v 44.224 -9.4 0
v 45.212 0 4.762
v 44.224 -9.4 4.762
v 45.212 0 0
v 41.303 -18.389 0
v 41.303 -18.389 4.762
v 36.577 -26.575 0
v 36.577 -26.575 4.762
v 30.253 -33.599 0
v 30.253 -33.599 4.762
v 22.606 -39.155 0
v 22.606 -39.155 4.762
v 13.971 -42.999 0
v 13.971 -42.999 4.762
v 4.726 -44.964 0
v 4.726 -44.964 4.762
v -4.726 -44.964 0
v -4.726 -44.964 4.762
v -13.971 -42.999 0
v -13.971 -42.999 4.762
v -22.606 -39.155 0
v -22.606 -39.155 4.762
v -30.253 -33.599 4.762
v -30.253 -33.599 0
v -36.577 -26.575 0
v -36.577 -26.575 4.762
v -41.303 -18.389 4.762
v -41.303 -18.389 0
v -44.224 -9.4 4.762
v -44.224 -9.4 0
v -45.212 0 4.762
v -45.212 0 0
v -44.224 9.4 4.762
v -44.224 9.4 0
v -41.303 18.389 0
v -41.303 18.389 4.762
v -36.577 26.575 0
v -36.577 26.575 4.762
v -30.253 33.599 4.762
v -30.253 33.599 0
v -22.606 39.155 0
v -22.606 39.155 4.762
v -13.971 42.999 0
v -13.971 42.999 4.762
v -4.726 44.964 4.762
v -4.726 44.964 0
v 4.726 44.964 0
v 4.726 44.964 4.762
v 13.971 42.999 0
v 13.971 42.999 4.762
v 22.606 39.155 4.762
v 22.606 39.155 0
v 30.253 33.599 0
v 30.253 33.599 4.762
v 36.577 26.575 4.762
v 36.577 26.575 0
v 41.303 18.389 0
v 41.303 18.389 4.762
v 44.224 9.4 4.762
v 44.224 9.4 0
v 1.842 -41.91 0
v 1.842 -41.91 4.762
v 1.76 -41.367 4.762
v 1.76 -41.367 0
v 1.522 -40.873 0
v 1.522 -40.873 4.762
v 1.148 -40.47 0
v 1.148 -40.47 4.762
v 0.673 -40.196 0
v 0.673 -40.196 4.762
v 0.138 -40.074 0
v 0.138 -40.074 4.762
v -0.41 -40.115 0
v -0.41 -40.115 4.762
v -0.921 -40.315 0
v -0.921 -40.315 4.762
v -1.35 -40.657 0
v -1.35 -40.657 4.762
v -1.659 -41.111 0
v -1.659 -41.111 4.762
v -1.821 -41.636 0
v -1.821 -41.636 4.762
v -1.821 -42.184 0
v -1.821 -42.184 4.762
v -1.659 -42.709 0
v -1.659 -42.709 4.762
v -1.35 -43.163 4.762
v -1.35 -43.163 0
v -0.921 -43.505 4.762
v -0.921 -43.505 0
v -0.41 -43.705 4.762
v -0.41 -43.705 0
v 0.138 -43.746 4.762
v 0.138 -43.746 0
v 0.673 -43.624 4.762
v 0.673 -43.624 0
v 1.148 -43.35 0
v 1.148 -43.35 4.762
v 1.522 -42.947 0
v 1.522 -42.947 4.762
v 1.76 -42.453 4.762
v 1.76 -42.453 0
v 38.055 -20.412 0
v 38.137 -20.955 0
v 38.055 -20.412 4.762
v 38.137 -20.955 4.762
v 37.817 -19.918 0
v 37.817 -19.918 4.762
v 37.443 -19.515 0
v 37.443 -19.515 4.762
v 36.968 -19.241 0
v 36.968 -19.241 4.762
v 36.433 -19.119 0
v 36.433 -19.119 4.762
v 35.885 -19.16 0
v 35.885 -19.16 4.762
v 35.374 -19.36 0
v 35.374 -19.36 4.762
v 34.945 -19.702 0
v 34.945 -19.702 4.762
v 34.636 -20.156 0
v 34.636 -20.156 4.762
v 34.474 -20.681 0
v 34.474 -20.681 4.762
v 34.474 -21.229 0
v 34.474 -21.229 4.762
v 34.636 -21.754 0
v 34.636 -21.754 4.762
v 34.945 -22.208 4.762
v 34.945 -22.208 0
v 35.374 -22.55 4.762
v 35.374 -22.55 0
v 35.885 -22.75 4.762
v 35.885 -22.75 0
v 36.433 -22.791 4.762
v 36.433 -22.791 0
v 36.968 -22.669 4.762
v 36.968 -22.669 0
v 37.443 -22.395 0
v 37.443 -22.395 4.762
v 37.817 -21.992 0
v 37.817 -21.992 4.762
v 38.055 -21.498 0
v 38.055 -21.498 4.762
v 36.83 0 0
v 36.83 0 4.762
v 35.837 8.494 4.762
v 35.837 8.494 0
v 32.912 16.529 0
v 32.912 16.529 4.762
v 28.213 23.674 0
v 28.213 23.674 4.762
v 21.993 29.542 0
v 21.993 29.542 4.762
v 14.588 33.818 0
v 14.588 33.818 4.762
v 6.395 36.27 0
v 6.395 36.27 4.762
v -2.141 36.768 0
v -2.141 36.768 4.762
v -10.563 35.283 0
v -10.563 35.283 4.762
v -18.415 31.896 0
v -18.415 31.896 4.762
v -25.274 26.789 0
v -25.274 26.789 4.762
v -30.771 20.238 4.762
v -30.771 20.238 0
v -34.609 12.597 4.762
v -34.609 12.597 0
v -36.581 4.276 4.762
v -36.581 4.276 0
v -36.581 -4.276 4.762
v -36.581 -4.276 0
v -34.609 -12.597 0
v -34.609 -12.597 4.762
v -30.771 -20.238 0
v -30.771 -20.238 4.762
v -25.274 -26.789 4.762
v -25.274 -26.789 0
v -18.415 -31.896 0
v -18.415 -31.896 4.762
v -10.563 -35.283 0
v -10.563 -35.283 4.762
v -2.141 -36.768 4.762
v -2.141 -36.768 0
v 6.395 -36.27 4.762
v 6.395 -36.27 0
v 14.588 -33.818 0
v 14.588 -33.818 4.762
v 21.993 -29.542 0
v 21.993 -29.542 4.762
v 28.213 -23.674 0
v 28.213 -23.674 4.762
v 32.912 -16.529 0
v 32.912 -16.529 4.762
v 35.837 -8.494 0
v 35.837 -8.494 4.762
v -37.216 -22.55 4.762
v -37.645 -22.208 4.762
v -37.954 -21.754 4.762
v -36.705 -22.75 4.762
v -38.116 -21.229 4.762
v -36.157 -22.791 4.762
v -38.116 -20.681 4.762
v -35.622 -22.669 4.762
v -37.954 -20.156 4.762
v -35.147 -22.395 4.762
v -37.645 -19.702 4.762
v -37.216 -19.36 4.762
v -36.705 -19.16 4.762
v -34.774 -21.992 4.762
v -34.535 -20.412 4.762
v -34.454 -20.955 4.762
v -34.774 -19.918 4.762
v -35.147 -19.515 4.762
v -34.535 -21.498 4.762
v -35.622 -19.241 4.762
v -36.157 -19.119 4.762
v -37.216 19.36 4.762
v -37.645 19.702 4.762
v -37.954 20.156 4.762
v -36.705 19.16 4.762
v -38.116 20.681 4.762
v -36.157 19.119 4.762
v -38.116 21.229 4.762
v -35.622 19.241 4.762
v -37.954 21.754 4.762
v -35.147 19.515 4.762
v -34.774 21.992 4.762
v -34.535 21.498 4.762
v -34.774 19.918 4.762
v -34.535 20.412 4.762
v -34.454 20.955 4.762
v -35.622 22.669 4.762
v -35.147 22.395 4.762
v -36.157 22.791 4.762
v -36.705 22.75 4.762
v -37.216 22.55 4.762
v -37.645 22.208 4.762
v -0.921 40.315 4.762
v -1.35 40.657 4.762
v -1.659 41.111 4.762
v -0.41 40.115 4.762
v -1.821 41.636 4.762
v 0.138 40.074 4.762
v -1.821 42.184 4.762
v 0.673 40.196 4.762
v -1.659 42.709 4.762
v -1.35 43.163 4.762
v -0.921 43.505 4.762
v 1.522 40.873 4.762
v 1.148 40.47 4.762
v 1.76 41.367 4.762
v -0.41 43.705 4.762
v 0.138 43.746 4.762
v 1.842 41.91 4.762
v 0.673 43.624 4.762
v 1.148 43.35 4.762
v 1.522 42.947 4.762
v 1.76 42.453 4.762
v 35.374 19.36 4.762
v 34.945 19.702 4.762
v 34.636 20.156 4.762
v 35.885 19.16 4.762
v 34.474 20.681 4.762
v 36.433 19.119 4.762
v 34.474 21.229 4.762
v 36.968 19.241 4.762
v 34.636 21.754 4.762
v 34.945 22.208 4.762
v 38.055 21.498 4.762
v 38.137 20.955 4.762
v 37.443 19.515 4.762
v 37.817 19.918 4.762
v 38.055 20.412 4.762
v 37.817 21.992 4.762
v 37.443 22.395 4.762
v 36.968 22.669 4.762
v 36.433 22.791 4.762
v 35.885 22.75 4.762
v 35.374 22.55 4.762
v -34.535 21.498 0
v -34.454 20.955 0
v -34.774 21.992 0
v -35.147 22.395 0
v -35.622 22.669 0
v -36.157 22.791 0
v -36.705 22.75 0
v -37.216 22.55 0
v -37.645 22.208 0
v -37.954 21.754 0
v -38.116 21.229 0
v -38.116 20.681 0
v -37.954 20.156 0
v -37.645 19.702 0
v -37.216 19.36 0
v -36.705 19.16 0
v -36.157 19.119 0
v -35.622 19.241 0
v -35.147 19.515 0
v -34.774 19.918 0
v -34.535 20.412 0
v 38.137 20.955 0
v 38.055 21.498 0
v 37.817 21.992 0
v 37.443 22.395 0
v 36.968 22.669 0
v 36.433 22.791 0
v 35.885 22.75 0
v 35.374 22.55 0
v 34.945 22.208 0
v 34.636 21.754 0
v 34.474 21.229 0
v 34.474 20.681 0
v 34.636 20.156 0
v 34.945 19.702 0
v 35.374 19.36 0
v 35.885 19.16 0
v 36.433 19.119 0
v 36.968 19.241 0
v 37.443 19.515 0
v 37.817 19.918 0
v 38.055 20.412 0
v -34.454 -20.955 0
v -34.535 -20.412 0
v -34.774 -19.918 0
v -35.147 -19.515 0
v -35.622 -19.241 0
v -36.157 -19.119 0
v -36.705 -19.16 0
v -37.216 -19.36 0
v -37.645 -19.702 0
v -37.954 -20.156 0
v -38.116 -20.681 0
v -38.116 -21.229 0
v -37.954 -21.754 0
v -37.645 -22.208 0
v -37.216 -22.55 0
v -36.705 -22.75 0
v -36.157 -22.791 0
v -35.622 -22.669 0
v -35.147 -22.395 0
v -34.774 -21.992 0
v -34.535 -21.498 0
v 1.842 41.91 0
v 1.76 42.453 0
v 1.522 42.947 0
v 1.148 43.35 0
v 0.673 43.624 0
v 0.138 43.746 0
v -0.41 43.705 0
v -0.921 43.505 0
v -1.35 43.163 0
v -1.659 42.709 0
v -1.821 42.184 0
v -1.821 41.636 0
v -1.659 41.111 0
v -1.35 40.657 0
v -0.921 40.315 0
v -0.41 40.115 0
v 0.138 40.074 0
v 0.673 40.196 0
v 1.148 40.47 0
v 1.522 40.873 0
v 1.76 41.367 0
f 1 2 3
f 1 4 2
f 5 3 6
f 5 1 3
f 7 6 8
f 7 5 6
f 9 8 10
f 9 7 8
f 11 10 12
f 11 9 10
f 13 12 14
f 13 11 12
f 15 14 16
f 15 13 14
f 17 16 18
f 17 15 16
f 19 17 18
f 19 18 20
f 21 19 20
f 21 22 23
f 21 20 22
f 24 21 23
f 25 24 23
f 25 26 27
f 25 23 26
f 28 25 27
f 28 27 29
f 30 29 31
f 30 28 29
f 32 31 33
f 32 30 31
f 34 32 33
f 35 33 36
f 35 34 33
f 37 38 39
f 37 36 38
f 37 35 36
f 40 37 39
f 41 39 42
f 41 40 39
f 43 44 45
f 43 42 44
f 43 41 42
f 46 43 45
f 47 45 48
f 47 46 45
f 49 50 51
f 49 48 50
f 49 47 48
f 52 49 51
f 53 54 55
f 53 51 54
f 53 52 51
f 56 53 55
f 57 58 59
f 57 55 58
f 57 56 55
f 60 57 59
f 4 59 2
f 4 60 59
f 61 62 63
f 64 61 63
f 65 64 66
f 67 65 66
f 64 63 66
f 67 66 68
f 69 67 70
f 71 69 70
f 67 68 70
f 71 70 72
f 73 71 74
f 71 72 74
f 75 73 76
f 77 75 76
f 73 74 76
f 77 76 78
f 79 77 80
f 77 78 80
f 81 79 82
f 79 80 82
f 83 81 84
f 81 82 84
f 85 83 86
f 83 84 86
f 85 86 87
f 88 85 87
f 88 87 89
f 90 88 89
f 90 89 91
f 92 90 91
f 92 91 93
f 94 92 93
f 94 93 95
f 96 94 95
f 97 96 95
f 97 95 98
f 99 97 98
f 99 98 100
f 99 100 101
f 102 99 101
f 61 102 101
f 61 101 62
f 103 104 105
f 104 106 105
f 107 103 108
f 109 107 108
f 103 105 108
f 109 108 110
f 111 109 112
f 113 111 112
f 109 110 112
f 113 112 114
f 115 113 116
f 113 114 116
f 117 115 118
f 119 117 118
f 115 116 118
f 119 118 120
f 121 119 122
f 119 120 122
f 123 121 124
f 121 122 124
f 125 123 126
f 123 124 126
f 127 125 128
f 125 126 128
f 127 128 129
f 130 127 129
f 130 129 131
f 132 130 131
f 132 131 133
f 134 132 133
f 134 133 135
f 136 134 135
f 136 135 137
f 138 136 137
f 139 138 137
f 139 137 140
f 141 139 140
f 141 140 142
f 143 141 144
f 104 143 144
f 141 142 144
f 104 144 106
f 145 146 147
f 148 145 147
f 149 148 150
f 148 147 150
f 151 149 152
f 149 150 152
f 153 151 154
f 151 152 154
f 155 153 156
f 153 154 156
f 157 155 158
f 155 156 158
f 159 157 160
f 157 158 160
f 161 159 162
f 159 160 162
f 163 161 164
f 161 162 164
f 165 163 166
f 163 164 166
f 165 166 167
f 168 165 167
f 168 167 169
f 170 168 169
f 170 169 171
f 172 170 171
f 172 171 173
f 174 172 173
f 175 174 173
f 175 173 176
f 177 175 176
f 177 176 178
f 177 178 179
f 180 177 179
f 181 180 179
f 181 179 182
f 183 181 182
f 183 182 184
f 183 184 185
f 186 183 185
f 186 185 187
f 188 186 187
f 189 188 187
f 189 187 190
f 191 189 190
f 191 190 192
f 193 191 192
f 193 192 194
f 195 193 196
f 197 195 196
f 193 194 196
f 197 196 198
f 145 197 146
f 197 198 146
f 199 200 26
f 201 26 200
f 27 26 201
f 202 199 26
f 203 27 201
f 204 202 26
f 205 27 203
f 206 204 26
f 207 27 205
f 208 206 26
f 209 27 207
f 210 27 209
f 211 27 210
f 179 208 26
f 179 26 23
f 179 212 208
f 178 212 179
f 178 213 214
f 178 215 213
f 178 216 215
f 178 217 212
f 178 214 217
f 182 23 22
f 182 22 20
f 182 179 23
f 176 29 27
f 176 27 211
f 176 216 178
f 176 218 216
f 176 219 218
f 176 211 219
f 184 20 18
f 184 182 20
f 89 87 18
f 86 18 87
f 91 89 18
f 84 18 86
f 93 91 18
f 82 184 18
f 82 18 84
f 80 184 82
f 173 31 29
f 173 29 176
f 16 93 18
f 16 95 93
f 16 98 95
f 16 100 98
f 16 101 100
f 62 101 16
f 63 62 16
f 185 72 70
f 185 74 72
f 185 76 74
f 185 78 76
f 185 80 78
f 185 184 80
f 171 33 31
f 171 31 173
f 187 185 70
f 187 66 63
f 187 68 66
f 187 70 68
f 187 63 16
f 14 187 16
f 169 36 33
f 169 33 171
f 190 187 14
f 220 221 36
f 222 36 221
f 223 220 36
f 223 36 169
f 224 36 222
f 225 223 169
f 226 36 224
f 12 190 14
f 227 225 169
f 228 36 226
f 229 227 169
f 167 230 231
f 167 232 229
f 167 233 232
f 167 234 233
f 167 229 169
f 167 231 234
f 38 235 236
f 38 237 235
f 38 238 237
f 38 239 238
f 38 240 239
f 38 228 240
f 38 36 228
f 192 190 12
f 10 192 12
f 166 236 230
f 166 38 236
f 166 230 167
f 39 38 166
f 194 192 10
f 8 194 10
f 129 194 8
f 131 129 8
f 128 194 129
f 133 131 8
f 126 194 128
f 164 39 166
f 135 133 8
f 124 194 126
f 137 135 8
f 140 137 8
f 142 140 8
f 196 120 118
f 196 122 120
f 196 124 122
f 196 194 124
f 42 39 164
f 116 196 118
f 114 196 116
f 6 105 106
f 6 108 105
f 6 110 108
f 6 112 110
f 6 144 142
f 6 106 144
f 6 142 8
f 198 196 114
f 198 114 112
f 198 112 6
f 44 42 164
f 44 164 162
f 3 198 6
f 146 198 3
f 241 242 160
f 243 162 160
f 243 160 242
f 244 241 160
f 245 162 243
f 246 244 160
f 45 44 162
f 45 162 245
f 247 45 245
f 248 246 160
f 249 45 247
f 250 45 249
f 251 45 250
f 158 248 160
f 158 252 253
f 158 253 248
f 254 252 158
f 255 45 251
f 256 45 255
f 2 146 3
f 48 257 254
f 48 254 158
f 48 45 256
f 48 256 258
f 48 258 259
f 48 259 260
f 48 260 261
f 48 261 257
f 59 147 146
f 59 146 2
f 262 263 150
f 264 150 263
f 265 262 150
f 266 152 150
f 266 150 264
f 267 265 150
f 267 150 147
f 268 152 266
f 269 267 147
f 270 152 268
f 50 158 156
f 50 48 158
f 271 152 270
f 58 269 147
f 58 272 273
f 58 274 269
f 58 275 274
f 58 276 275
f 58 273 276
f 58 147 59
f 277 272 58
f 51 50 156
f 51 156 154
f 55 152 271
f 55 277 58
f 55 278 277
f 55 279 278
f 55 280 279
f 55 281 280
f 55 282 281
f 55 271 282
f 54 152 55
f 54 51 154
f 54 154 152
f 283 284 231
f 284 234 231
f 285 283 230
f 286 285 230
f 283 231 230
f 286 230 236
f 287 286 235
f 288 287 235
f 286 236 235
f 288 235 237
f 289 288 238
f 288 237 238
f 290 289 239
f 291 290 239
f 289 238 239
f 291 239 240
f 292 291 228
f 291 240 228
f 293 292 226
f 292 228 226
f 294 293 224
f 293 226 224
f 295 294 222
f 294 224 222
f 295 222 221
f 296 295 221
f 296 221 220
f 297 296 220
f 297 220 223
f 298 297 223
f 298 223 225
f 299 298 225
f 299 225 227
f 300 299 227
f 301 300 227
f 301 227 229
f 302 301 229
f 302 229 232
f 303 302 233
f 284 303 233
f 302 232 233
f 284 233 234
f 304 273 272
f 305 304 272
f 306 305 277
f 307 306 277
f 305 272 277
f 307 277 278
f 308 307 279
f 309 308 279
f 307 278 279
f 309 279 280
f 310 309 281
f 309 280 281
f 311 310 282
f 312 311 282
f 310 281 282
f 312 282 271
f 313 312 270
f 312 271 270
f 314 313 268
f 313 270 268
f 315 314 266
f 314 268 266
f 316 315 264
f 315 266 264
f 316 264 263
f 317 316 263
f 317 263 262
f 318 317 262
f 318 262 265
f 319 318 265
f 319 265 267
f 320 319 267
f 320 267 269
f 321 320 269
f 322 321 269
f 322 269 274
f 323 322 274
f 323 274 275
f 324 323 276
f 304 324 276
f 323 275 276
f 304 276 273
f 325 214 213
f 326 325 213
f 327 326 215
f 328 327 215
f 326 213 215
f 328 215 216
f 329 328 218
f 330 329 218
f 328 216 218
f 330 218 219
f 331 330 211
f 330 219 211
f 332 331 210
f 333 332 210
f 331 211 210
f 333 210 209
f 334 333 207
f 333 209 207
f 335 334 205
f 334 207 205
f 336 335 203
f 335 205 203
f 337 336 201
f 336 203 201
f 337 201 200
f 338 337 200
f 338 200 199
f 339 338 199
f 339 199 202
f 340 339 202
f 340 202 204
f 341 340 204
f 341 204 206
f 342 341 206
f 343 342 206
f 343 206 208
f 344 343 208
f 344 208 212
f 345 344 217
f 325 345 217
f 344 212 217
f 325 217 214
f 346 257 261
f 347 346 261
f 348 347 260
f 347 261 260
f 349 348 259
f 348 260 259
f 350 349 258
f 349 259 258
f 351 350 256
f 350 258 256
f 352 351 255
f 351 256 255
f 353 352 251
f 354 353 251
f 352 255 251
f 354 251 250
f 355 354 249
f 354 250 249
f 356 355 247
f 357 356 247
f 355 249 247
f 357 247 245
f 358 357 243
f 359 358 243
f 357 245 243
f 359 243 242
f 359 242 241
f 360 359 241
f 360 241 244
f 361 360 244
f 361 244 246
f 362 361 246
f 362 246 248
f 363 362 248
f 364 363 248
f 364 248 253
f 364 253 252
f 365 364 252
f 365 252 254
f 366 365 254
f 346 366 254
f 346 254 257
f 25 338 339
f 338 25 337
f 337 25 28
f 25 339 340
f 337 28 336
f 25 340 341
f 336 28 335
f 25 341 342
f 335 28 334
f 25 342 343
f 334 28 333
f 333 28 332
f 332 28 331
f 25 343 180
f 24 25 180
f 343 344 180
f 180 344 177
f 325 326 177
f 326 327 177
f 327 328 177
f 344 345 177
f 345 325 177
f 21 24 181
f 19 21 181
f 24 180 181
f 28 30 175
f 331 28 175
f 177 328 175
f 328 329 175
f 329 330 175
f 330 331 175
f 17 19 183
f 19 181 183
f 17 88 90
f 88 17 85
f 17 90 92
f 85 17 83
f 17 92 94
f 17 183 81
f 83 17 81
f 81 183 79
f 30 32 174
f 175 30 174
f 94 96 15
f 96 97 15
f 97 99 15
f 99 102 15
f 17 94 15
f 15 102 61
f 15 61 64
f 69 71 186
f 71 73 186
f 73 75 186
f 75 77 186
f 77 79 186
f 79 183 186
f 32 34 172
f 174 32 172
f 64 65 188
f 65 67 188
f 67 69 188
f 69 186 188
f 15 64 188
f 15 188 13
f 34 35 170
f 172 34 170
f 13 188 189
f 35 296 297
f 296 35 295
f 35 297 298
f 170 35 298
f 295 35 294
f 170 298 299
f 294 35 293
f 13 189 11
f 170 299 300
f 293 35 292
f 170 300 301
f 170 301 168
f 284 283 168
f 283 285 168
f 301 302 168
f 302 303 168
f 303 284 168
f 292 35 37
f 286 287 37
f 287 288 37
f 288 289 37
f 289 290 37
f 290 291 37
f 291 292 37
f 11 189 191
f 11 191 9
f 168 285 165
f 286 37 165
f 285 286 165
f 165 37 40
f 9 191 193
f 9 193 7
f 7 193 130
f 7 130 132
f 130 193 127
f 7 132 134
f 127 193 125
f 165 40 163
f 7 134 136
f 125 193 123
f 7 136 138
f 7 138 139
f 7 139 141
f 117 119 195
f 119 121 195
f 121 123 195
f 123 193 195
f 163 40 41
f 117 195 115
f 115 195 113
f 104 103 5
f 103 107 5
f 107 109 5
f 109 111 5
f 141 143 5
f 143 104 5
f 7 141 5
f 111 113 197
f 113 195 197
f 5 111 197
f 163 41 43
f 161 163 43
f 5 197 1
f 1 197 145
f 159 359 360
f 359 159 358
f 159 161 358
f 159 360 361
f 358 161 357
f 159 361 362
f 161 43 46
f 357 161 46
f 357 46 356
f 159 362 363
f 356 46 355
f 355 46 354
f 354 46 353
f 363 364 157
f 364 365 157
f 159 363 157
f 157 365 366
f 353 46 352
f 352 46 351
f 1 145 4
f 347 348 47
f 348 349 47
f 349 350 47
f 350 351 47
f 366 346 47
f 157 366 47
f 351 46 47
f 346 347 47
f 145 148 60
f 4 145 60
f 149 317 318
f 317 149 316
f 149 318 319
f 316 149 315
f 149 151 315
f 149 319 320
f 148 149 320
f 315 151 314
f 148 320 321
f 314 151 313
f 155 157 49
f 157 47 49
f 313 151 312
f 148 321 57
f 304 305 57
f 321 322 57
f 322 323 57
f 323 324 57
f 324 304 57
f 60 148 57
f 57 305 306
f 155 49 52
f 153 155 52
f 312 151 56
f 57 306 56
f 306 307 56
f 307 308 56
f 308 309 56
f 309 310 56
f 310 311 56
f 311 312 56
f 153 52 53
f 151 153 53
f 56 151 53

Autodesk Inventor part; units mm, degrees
ref_plane "YZ Plane" through (0, 0, 0) normal (1, 0, 0) x (0, 1, 0)
ref_plane "XZ Plane" through (0, 0, 0) normal (0, 1, 0) x (-1, 0, 0)
ref_plane "XY Plane" through (0, 0, 0) normal (0, 0, 1) x (1, 0, 0)
sketch "Sketch1" plane through (0, 0, 0) normal (0, 0, 1) x (1, 0, 0)
  circle A0 centre (0, 0) radius 45.212
  dimension "d0" = 90.424
extrude "Extrusion1" add sketch "Sketch1" along normal blind 4.7625
sketch "Sketch2" plane through (0, 0, 4.7625) normal (0, 0, 1) x (1, 0, 0)
  line L0 (0, 0) -> (0, 41.91)
  circle A0 centre (0, 41.91) radius 1.8415
  circle A1 centre (-36.2951, 20.955) radius 1.8415
  circle A2 centre (-36.2951, -20.955) radius 1.8415
  circle A3 centre (0, -41.91) radius 1.8415
  circle A4 centre (36.2951, -20.955) radius 1.8415
  circle A5 centre (36.2951, 20.955) radius 1.8415
  dimension "d3" = 41.91
  dimension "d4" = 3.683
  dimension "d7" = 360
extrude "Extrusion2" cut sketch "Sketch2" against normal blind 4.7625
sketch "Sketch4" plane through (0, 0, 4.7625) normal (0, 0, 1) x (1, 0, 0)
  circle A0 centre (36.2951, -20.955) radius 1.8415 projected
  circle A1 centre (-36.2951, -20.955) radius 1.8415 projected
  circle A2 centre (0, 41.91) radius 1.8415 projected
  circle A3 centre (-36.2951, 20.955) radius 1.8415 projected
  circle A4 centre (0, -41.91) radius 1.8415 projected
  circle A5 centre (36.2951, 20.955) radius 1.8415 projected
  circle A6 centre (0, 0) radius 45.212 projected
  circle A7 centre (0, 0) radius 36.83
  dimension "d17" = 73.66
extrude "Extrusion4" cut sketch "Sketch4" against normal blind 25.4 contours A7
properties part number "foreElectronicsSealingDisc" material "Aluminum 6061"
